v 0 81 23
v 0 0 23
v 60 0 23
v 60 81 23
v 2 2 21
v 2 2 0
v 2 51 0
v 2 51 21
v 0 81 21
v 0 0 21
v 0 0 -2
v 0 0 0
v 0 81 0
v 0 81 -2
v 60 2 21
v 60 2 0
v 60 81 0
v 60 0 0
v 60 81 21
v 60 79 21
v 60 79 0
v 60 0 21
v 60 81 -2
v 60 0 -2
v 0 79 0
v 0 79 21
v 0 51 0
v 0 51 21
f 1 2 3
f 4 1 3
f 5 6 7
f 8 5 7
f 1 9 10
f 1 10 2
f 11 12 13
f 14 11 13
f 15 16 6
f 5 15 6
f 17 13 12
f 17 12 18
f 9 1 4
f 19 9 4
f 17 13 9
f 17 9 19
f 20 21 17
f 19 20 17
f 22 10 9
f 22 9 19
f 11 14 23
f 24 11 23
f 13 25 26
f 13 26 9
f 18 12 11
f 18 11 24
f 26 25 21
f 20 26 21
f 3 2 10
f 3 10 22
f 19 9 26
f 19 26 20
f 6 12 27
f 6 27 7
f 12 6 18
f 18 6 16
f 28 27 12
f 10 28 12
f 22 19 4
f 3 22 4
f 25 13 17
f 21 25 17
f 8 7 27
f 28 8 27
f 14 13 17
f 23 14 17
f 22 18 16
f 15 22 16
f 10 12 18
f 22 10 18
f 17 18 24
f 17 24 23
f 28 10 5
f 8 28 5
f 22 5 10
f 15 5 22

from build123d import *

# Parameters (mm, degrees)
F0_W     = 60
F0_H     = 81
F1_DEPTH = 2
F2_W     = 60
F2_H     = 2
F5_DEPTH = 21
F4_W     = 60
F4_H     = 2
F6_DEPTH = 81


with BuildPart() as f1:
    # F0 (on Top) → F1 (new body)
    with BuildSketch(Plane.XY):
        with Locations((30, 40.5)):
            Rectangle(F0_W, F0_H)
    extrude(amount=-F1_DEPTH)


with BuildPart() as f5:
    # F2 (on Top) → F5 (new body)
    with BuildSketch(Plane.XY):
        Polygon((0, 51), (0, 0), (60, 0), (60, 2), (2, 2), (2, 51), align=None)
        with Locations((30, 80)):
            Rectangle(F2_W, F2_H)
    extrude(amount=F5_DEPTH)


with BuildPart() as f6:
    # F4 (on Front) → F6 (new body)
    with BuildSketch(Plane.XZ):
        with Locations((30, 22)):
            Rectangle(F4_W, F4_H)
    extrude(amount=-F6_DEPTH)


solid = Compound([f1.part, f5.part, f6.part])
